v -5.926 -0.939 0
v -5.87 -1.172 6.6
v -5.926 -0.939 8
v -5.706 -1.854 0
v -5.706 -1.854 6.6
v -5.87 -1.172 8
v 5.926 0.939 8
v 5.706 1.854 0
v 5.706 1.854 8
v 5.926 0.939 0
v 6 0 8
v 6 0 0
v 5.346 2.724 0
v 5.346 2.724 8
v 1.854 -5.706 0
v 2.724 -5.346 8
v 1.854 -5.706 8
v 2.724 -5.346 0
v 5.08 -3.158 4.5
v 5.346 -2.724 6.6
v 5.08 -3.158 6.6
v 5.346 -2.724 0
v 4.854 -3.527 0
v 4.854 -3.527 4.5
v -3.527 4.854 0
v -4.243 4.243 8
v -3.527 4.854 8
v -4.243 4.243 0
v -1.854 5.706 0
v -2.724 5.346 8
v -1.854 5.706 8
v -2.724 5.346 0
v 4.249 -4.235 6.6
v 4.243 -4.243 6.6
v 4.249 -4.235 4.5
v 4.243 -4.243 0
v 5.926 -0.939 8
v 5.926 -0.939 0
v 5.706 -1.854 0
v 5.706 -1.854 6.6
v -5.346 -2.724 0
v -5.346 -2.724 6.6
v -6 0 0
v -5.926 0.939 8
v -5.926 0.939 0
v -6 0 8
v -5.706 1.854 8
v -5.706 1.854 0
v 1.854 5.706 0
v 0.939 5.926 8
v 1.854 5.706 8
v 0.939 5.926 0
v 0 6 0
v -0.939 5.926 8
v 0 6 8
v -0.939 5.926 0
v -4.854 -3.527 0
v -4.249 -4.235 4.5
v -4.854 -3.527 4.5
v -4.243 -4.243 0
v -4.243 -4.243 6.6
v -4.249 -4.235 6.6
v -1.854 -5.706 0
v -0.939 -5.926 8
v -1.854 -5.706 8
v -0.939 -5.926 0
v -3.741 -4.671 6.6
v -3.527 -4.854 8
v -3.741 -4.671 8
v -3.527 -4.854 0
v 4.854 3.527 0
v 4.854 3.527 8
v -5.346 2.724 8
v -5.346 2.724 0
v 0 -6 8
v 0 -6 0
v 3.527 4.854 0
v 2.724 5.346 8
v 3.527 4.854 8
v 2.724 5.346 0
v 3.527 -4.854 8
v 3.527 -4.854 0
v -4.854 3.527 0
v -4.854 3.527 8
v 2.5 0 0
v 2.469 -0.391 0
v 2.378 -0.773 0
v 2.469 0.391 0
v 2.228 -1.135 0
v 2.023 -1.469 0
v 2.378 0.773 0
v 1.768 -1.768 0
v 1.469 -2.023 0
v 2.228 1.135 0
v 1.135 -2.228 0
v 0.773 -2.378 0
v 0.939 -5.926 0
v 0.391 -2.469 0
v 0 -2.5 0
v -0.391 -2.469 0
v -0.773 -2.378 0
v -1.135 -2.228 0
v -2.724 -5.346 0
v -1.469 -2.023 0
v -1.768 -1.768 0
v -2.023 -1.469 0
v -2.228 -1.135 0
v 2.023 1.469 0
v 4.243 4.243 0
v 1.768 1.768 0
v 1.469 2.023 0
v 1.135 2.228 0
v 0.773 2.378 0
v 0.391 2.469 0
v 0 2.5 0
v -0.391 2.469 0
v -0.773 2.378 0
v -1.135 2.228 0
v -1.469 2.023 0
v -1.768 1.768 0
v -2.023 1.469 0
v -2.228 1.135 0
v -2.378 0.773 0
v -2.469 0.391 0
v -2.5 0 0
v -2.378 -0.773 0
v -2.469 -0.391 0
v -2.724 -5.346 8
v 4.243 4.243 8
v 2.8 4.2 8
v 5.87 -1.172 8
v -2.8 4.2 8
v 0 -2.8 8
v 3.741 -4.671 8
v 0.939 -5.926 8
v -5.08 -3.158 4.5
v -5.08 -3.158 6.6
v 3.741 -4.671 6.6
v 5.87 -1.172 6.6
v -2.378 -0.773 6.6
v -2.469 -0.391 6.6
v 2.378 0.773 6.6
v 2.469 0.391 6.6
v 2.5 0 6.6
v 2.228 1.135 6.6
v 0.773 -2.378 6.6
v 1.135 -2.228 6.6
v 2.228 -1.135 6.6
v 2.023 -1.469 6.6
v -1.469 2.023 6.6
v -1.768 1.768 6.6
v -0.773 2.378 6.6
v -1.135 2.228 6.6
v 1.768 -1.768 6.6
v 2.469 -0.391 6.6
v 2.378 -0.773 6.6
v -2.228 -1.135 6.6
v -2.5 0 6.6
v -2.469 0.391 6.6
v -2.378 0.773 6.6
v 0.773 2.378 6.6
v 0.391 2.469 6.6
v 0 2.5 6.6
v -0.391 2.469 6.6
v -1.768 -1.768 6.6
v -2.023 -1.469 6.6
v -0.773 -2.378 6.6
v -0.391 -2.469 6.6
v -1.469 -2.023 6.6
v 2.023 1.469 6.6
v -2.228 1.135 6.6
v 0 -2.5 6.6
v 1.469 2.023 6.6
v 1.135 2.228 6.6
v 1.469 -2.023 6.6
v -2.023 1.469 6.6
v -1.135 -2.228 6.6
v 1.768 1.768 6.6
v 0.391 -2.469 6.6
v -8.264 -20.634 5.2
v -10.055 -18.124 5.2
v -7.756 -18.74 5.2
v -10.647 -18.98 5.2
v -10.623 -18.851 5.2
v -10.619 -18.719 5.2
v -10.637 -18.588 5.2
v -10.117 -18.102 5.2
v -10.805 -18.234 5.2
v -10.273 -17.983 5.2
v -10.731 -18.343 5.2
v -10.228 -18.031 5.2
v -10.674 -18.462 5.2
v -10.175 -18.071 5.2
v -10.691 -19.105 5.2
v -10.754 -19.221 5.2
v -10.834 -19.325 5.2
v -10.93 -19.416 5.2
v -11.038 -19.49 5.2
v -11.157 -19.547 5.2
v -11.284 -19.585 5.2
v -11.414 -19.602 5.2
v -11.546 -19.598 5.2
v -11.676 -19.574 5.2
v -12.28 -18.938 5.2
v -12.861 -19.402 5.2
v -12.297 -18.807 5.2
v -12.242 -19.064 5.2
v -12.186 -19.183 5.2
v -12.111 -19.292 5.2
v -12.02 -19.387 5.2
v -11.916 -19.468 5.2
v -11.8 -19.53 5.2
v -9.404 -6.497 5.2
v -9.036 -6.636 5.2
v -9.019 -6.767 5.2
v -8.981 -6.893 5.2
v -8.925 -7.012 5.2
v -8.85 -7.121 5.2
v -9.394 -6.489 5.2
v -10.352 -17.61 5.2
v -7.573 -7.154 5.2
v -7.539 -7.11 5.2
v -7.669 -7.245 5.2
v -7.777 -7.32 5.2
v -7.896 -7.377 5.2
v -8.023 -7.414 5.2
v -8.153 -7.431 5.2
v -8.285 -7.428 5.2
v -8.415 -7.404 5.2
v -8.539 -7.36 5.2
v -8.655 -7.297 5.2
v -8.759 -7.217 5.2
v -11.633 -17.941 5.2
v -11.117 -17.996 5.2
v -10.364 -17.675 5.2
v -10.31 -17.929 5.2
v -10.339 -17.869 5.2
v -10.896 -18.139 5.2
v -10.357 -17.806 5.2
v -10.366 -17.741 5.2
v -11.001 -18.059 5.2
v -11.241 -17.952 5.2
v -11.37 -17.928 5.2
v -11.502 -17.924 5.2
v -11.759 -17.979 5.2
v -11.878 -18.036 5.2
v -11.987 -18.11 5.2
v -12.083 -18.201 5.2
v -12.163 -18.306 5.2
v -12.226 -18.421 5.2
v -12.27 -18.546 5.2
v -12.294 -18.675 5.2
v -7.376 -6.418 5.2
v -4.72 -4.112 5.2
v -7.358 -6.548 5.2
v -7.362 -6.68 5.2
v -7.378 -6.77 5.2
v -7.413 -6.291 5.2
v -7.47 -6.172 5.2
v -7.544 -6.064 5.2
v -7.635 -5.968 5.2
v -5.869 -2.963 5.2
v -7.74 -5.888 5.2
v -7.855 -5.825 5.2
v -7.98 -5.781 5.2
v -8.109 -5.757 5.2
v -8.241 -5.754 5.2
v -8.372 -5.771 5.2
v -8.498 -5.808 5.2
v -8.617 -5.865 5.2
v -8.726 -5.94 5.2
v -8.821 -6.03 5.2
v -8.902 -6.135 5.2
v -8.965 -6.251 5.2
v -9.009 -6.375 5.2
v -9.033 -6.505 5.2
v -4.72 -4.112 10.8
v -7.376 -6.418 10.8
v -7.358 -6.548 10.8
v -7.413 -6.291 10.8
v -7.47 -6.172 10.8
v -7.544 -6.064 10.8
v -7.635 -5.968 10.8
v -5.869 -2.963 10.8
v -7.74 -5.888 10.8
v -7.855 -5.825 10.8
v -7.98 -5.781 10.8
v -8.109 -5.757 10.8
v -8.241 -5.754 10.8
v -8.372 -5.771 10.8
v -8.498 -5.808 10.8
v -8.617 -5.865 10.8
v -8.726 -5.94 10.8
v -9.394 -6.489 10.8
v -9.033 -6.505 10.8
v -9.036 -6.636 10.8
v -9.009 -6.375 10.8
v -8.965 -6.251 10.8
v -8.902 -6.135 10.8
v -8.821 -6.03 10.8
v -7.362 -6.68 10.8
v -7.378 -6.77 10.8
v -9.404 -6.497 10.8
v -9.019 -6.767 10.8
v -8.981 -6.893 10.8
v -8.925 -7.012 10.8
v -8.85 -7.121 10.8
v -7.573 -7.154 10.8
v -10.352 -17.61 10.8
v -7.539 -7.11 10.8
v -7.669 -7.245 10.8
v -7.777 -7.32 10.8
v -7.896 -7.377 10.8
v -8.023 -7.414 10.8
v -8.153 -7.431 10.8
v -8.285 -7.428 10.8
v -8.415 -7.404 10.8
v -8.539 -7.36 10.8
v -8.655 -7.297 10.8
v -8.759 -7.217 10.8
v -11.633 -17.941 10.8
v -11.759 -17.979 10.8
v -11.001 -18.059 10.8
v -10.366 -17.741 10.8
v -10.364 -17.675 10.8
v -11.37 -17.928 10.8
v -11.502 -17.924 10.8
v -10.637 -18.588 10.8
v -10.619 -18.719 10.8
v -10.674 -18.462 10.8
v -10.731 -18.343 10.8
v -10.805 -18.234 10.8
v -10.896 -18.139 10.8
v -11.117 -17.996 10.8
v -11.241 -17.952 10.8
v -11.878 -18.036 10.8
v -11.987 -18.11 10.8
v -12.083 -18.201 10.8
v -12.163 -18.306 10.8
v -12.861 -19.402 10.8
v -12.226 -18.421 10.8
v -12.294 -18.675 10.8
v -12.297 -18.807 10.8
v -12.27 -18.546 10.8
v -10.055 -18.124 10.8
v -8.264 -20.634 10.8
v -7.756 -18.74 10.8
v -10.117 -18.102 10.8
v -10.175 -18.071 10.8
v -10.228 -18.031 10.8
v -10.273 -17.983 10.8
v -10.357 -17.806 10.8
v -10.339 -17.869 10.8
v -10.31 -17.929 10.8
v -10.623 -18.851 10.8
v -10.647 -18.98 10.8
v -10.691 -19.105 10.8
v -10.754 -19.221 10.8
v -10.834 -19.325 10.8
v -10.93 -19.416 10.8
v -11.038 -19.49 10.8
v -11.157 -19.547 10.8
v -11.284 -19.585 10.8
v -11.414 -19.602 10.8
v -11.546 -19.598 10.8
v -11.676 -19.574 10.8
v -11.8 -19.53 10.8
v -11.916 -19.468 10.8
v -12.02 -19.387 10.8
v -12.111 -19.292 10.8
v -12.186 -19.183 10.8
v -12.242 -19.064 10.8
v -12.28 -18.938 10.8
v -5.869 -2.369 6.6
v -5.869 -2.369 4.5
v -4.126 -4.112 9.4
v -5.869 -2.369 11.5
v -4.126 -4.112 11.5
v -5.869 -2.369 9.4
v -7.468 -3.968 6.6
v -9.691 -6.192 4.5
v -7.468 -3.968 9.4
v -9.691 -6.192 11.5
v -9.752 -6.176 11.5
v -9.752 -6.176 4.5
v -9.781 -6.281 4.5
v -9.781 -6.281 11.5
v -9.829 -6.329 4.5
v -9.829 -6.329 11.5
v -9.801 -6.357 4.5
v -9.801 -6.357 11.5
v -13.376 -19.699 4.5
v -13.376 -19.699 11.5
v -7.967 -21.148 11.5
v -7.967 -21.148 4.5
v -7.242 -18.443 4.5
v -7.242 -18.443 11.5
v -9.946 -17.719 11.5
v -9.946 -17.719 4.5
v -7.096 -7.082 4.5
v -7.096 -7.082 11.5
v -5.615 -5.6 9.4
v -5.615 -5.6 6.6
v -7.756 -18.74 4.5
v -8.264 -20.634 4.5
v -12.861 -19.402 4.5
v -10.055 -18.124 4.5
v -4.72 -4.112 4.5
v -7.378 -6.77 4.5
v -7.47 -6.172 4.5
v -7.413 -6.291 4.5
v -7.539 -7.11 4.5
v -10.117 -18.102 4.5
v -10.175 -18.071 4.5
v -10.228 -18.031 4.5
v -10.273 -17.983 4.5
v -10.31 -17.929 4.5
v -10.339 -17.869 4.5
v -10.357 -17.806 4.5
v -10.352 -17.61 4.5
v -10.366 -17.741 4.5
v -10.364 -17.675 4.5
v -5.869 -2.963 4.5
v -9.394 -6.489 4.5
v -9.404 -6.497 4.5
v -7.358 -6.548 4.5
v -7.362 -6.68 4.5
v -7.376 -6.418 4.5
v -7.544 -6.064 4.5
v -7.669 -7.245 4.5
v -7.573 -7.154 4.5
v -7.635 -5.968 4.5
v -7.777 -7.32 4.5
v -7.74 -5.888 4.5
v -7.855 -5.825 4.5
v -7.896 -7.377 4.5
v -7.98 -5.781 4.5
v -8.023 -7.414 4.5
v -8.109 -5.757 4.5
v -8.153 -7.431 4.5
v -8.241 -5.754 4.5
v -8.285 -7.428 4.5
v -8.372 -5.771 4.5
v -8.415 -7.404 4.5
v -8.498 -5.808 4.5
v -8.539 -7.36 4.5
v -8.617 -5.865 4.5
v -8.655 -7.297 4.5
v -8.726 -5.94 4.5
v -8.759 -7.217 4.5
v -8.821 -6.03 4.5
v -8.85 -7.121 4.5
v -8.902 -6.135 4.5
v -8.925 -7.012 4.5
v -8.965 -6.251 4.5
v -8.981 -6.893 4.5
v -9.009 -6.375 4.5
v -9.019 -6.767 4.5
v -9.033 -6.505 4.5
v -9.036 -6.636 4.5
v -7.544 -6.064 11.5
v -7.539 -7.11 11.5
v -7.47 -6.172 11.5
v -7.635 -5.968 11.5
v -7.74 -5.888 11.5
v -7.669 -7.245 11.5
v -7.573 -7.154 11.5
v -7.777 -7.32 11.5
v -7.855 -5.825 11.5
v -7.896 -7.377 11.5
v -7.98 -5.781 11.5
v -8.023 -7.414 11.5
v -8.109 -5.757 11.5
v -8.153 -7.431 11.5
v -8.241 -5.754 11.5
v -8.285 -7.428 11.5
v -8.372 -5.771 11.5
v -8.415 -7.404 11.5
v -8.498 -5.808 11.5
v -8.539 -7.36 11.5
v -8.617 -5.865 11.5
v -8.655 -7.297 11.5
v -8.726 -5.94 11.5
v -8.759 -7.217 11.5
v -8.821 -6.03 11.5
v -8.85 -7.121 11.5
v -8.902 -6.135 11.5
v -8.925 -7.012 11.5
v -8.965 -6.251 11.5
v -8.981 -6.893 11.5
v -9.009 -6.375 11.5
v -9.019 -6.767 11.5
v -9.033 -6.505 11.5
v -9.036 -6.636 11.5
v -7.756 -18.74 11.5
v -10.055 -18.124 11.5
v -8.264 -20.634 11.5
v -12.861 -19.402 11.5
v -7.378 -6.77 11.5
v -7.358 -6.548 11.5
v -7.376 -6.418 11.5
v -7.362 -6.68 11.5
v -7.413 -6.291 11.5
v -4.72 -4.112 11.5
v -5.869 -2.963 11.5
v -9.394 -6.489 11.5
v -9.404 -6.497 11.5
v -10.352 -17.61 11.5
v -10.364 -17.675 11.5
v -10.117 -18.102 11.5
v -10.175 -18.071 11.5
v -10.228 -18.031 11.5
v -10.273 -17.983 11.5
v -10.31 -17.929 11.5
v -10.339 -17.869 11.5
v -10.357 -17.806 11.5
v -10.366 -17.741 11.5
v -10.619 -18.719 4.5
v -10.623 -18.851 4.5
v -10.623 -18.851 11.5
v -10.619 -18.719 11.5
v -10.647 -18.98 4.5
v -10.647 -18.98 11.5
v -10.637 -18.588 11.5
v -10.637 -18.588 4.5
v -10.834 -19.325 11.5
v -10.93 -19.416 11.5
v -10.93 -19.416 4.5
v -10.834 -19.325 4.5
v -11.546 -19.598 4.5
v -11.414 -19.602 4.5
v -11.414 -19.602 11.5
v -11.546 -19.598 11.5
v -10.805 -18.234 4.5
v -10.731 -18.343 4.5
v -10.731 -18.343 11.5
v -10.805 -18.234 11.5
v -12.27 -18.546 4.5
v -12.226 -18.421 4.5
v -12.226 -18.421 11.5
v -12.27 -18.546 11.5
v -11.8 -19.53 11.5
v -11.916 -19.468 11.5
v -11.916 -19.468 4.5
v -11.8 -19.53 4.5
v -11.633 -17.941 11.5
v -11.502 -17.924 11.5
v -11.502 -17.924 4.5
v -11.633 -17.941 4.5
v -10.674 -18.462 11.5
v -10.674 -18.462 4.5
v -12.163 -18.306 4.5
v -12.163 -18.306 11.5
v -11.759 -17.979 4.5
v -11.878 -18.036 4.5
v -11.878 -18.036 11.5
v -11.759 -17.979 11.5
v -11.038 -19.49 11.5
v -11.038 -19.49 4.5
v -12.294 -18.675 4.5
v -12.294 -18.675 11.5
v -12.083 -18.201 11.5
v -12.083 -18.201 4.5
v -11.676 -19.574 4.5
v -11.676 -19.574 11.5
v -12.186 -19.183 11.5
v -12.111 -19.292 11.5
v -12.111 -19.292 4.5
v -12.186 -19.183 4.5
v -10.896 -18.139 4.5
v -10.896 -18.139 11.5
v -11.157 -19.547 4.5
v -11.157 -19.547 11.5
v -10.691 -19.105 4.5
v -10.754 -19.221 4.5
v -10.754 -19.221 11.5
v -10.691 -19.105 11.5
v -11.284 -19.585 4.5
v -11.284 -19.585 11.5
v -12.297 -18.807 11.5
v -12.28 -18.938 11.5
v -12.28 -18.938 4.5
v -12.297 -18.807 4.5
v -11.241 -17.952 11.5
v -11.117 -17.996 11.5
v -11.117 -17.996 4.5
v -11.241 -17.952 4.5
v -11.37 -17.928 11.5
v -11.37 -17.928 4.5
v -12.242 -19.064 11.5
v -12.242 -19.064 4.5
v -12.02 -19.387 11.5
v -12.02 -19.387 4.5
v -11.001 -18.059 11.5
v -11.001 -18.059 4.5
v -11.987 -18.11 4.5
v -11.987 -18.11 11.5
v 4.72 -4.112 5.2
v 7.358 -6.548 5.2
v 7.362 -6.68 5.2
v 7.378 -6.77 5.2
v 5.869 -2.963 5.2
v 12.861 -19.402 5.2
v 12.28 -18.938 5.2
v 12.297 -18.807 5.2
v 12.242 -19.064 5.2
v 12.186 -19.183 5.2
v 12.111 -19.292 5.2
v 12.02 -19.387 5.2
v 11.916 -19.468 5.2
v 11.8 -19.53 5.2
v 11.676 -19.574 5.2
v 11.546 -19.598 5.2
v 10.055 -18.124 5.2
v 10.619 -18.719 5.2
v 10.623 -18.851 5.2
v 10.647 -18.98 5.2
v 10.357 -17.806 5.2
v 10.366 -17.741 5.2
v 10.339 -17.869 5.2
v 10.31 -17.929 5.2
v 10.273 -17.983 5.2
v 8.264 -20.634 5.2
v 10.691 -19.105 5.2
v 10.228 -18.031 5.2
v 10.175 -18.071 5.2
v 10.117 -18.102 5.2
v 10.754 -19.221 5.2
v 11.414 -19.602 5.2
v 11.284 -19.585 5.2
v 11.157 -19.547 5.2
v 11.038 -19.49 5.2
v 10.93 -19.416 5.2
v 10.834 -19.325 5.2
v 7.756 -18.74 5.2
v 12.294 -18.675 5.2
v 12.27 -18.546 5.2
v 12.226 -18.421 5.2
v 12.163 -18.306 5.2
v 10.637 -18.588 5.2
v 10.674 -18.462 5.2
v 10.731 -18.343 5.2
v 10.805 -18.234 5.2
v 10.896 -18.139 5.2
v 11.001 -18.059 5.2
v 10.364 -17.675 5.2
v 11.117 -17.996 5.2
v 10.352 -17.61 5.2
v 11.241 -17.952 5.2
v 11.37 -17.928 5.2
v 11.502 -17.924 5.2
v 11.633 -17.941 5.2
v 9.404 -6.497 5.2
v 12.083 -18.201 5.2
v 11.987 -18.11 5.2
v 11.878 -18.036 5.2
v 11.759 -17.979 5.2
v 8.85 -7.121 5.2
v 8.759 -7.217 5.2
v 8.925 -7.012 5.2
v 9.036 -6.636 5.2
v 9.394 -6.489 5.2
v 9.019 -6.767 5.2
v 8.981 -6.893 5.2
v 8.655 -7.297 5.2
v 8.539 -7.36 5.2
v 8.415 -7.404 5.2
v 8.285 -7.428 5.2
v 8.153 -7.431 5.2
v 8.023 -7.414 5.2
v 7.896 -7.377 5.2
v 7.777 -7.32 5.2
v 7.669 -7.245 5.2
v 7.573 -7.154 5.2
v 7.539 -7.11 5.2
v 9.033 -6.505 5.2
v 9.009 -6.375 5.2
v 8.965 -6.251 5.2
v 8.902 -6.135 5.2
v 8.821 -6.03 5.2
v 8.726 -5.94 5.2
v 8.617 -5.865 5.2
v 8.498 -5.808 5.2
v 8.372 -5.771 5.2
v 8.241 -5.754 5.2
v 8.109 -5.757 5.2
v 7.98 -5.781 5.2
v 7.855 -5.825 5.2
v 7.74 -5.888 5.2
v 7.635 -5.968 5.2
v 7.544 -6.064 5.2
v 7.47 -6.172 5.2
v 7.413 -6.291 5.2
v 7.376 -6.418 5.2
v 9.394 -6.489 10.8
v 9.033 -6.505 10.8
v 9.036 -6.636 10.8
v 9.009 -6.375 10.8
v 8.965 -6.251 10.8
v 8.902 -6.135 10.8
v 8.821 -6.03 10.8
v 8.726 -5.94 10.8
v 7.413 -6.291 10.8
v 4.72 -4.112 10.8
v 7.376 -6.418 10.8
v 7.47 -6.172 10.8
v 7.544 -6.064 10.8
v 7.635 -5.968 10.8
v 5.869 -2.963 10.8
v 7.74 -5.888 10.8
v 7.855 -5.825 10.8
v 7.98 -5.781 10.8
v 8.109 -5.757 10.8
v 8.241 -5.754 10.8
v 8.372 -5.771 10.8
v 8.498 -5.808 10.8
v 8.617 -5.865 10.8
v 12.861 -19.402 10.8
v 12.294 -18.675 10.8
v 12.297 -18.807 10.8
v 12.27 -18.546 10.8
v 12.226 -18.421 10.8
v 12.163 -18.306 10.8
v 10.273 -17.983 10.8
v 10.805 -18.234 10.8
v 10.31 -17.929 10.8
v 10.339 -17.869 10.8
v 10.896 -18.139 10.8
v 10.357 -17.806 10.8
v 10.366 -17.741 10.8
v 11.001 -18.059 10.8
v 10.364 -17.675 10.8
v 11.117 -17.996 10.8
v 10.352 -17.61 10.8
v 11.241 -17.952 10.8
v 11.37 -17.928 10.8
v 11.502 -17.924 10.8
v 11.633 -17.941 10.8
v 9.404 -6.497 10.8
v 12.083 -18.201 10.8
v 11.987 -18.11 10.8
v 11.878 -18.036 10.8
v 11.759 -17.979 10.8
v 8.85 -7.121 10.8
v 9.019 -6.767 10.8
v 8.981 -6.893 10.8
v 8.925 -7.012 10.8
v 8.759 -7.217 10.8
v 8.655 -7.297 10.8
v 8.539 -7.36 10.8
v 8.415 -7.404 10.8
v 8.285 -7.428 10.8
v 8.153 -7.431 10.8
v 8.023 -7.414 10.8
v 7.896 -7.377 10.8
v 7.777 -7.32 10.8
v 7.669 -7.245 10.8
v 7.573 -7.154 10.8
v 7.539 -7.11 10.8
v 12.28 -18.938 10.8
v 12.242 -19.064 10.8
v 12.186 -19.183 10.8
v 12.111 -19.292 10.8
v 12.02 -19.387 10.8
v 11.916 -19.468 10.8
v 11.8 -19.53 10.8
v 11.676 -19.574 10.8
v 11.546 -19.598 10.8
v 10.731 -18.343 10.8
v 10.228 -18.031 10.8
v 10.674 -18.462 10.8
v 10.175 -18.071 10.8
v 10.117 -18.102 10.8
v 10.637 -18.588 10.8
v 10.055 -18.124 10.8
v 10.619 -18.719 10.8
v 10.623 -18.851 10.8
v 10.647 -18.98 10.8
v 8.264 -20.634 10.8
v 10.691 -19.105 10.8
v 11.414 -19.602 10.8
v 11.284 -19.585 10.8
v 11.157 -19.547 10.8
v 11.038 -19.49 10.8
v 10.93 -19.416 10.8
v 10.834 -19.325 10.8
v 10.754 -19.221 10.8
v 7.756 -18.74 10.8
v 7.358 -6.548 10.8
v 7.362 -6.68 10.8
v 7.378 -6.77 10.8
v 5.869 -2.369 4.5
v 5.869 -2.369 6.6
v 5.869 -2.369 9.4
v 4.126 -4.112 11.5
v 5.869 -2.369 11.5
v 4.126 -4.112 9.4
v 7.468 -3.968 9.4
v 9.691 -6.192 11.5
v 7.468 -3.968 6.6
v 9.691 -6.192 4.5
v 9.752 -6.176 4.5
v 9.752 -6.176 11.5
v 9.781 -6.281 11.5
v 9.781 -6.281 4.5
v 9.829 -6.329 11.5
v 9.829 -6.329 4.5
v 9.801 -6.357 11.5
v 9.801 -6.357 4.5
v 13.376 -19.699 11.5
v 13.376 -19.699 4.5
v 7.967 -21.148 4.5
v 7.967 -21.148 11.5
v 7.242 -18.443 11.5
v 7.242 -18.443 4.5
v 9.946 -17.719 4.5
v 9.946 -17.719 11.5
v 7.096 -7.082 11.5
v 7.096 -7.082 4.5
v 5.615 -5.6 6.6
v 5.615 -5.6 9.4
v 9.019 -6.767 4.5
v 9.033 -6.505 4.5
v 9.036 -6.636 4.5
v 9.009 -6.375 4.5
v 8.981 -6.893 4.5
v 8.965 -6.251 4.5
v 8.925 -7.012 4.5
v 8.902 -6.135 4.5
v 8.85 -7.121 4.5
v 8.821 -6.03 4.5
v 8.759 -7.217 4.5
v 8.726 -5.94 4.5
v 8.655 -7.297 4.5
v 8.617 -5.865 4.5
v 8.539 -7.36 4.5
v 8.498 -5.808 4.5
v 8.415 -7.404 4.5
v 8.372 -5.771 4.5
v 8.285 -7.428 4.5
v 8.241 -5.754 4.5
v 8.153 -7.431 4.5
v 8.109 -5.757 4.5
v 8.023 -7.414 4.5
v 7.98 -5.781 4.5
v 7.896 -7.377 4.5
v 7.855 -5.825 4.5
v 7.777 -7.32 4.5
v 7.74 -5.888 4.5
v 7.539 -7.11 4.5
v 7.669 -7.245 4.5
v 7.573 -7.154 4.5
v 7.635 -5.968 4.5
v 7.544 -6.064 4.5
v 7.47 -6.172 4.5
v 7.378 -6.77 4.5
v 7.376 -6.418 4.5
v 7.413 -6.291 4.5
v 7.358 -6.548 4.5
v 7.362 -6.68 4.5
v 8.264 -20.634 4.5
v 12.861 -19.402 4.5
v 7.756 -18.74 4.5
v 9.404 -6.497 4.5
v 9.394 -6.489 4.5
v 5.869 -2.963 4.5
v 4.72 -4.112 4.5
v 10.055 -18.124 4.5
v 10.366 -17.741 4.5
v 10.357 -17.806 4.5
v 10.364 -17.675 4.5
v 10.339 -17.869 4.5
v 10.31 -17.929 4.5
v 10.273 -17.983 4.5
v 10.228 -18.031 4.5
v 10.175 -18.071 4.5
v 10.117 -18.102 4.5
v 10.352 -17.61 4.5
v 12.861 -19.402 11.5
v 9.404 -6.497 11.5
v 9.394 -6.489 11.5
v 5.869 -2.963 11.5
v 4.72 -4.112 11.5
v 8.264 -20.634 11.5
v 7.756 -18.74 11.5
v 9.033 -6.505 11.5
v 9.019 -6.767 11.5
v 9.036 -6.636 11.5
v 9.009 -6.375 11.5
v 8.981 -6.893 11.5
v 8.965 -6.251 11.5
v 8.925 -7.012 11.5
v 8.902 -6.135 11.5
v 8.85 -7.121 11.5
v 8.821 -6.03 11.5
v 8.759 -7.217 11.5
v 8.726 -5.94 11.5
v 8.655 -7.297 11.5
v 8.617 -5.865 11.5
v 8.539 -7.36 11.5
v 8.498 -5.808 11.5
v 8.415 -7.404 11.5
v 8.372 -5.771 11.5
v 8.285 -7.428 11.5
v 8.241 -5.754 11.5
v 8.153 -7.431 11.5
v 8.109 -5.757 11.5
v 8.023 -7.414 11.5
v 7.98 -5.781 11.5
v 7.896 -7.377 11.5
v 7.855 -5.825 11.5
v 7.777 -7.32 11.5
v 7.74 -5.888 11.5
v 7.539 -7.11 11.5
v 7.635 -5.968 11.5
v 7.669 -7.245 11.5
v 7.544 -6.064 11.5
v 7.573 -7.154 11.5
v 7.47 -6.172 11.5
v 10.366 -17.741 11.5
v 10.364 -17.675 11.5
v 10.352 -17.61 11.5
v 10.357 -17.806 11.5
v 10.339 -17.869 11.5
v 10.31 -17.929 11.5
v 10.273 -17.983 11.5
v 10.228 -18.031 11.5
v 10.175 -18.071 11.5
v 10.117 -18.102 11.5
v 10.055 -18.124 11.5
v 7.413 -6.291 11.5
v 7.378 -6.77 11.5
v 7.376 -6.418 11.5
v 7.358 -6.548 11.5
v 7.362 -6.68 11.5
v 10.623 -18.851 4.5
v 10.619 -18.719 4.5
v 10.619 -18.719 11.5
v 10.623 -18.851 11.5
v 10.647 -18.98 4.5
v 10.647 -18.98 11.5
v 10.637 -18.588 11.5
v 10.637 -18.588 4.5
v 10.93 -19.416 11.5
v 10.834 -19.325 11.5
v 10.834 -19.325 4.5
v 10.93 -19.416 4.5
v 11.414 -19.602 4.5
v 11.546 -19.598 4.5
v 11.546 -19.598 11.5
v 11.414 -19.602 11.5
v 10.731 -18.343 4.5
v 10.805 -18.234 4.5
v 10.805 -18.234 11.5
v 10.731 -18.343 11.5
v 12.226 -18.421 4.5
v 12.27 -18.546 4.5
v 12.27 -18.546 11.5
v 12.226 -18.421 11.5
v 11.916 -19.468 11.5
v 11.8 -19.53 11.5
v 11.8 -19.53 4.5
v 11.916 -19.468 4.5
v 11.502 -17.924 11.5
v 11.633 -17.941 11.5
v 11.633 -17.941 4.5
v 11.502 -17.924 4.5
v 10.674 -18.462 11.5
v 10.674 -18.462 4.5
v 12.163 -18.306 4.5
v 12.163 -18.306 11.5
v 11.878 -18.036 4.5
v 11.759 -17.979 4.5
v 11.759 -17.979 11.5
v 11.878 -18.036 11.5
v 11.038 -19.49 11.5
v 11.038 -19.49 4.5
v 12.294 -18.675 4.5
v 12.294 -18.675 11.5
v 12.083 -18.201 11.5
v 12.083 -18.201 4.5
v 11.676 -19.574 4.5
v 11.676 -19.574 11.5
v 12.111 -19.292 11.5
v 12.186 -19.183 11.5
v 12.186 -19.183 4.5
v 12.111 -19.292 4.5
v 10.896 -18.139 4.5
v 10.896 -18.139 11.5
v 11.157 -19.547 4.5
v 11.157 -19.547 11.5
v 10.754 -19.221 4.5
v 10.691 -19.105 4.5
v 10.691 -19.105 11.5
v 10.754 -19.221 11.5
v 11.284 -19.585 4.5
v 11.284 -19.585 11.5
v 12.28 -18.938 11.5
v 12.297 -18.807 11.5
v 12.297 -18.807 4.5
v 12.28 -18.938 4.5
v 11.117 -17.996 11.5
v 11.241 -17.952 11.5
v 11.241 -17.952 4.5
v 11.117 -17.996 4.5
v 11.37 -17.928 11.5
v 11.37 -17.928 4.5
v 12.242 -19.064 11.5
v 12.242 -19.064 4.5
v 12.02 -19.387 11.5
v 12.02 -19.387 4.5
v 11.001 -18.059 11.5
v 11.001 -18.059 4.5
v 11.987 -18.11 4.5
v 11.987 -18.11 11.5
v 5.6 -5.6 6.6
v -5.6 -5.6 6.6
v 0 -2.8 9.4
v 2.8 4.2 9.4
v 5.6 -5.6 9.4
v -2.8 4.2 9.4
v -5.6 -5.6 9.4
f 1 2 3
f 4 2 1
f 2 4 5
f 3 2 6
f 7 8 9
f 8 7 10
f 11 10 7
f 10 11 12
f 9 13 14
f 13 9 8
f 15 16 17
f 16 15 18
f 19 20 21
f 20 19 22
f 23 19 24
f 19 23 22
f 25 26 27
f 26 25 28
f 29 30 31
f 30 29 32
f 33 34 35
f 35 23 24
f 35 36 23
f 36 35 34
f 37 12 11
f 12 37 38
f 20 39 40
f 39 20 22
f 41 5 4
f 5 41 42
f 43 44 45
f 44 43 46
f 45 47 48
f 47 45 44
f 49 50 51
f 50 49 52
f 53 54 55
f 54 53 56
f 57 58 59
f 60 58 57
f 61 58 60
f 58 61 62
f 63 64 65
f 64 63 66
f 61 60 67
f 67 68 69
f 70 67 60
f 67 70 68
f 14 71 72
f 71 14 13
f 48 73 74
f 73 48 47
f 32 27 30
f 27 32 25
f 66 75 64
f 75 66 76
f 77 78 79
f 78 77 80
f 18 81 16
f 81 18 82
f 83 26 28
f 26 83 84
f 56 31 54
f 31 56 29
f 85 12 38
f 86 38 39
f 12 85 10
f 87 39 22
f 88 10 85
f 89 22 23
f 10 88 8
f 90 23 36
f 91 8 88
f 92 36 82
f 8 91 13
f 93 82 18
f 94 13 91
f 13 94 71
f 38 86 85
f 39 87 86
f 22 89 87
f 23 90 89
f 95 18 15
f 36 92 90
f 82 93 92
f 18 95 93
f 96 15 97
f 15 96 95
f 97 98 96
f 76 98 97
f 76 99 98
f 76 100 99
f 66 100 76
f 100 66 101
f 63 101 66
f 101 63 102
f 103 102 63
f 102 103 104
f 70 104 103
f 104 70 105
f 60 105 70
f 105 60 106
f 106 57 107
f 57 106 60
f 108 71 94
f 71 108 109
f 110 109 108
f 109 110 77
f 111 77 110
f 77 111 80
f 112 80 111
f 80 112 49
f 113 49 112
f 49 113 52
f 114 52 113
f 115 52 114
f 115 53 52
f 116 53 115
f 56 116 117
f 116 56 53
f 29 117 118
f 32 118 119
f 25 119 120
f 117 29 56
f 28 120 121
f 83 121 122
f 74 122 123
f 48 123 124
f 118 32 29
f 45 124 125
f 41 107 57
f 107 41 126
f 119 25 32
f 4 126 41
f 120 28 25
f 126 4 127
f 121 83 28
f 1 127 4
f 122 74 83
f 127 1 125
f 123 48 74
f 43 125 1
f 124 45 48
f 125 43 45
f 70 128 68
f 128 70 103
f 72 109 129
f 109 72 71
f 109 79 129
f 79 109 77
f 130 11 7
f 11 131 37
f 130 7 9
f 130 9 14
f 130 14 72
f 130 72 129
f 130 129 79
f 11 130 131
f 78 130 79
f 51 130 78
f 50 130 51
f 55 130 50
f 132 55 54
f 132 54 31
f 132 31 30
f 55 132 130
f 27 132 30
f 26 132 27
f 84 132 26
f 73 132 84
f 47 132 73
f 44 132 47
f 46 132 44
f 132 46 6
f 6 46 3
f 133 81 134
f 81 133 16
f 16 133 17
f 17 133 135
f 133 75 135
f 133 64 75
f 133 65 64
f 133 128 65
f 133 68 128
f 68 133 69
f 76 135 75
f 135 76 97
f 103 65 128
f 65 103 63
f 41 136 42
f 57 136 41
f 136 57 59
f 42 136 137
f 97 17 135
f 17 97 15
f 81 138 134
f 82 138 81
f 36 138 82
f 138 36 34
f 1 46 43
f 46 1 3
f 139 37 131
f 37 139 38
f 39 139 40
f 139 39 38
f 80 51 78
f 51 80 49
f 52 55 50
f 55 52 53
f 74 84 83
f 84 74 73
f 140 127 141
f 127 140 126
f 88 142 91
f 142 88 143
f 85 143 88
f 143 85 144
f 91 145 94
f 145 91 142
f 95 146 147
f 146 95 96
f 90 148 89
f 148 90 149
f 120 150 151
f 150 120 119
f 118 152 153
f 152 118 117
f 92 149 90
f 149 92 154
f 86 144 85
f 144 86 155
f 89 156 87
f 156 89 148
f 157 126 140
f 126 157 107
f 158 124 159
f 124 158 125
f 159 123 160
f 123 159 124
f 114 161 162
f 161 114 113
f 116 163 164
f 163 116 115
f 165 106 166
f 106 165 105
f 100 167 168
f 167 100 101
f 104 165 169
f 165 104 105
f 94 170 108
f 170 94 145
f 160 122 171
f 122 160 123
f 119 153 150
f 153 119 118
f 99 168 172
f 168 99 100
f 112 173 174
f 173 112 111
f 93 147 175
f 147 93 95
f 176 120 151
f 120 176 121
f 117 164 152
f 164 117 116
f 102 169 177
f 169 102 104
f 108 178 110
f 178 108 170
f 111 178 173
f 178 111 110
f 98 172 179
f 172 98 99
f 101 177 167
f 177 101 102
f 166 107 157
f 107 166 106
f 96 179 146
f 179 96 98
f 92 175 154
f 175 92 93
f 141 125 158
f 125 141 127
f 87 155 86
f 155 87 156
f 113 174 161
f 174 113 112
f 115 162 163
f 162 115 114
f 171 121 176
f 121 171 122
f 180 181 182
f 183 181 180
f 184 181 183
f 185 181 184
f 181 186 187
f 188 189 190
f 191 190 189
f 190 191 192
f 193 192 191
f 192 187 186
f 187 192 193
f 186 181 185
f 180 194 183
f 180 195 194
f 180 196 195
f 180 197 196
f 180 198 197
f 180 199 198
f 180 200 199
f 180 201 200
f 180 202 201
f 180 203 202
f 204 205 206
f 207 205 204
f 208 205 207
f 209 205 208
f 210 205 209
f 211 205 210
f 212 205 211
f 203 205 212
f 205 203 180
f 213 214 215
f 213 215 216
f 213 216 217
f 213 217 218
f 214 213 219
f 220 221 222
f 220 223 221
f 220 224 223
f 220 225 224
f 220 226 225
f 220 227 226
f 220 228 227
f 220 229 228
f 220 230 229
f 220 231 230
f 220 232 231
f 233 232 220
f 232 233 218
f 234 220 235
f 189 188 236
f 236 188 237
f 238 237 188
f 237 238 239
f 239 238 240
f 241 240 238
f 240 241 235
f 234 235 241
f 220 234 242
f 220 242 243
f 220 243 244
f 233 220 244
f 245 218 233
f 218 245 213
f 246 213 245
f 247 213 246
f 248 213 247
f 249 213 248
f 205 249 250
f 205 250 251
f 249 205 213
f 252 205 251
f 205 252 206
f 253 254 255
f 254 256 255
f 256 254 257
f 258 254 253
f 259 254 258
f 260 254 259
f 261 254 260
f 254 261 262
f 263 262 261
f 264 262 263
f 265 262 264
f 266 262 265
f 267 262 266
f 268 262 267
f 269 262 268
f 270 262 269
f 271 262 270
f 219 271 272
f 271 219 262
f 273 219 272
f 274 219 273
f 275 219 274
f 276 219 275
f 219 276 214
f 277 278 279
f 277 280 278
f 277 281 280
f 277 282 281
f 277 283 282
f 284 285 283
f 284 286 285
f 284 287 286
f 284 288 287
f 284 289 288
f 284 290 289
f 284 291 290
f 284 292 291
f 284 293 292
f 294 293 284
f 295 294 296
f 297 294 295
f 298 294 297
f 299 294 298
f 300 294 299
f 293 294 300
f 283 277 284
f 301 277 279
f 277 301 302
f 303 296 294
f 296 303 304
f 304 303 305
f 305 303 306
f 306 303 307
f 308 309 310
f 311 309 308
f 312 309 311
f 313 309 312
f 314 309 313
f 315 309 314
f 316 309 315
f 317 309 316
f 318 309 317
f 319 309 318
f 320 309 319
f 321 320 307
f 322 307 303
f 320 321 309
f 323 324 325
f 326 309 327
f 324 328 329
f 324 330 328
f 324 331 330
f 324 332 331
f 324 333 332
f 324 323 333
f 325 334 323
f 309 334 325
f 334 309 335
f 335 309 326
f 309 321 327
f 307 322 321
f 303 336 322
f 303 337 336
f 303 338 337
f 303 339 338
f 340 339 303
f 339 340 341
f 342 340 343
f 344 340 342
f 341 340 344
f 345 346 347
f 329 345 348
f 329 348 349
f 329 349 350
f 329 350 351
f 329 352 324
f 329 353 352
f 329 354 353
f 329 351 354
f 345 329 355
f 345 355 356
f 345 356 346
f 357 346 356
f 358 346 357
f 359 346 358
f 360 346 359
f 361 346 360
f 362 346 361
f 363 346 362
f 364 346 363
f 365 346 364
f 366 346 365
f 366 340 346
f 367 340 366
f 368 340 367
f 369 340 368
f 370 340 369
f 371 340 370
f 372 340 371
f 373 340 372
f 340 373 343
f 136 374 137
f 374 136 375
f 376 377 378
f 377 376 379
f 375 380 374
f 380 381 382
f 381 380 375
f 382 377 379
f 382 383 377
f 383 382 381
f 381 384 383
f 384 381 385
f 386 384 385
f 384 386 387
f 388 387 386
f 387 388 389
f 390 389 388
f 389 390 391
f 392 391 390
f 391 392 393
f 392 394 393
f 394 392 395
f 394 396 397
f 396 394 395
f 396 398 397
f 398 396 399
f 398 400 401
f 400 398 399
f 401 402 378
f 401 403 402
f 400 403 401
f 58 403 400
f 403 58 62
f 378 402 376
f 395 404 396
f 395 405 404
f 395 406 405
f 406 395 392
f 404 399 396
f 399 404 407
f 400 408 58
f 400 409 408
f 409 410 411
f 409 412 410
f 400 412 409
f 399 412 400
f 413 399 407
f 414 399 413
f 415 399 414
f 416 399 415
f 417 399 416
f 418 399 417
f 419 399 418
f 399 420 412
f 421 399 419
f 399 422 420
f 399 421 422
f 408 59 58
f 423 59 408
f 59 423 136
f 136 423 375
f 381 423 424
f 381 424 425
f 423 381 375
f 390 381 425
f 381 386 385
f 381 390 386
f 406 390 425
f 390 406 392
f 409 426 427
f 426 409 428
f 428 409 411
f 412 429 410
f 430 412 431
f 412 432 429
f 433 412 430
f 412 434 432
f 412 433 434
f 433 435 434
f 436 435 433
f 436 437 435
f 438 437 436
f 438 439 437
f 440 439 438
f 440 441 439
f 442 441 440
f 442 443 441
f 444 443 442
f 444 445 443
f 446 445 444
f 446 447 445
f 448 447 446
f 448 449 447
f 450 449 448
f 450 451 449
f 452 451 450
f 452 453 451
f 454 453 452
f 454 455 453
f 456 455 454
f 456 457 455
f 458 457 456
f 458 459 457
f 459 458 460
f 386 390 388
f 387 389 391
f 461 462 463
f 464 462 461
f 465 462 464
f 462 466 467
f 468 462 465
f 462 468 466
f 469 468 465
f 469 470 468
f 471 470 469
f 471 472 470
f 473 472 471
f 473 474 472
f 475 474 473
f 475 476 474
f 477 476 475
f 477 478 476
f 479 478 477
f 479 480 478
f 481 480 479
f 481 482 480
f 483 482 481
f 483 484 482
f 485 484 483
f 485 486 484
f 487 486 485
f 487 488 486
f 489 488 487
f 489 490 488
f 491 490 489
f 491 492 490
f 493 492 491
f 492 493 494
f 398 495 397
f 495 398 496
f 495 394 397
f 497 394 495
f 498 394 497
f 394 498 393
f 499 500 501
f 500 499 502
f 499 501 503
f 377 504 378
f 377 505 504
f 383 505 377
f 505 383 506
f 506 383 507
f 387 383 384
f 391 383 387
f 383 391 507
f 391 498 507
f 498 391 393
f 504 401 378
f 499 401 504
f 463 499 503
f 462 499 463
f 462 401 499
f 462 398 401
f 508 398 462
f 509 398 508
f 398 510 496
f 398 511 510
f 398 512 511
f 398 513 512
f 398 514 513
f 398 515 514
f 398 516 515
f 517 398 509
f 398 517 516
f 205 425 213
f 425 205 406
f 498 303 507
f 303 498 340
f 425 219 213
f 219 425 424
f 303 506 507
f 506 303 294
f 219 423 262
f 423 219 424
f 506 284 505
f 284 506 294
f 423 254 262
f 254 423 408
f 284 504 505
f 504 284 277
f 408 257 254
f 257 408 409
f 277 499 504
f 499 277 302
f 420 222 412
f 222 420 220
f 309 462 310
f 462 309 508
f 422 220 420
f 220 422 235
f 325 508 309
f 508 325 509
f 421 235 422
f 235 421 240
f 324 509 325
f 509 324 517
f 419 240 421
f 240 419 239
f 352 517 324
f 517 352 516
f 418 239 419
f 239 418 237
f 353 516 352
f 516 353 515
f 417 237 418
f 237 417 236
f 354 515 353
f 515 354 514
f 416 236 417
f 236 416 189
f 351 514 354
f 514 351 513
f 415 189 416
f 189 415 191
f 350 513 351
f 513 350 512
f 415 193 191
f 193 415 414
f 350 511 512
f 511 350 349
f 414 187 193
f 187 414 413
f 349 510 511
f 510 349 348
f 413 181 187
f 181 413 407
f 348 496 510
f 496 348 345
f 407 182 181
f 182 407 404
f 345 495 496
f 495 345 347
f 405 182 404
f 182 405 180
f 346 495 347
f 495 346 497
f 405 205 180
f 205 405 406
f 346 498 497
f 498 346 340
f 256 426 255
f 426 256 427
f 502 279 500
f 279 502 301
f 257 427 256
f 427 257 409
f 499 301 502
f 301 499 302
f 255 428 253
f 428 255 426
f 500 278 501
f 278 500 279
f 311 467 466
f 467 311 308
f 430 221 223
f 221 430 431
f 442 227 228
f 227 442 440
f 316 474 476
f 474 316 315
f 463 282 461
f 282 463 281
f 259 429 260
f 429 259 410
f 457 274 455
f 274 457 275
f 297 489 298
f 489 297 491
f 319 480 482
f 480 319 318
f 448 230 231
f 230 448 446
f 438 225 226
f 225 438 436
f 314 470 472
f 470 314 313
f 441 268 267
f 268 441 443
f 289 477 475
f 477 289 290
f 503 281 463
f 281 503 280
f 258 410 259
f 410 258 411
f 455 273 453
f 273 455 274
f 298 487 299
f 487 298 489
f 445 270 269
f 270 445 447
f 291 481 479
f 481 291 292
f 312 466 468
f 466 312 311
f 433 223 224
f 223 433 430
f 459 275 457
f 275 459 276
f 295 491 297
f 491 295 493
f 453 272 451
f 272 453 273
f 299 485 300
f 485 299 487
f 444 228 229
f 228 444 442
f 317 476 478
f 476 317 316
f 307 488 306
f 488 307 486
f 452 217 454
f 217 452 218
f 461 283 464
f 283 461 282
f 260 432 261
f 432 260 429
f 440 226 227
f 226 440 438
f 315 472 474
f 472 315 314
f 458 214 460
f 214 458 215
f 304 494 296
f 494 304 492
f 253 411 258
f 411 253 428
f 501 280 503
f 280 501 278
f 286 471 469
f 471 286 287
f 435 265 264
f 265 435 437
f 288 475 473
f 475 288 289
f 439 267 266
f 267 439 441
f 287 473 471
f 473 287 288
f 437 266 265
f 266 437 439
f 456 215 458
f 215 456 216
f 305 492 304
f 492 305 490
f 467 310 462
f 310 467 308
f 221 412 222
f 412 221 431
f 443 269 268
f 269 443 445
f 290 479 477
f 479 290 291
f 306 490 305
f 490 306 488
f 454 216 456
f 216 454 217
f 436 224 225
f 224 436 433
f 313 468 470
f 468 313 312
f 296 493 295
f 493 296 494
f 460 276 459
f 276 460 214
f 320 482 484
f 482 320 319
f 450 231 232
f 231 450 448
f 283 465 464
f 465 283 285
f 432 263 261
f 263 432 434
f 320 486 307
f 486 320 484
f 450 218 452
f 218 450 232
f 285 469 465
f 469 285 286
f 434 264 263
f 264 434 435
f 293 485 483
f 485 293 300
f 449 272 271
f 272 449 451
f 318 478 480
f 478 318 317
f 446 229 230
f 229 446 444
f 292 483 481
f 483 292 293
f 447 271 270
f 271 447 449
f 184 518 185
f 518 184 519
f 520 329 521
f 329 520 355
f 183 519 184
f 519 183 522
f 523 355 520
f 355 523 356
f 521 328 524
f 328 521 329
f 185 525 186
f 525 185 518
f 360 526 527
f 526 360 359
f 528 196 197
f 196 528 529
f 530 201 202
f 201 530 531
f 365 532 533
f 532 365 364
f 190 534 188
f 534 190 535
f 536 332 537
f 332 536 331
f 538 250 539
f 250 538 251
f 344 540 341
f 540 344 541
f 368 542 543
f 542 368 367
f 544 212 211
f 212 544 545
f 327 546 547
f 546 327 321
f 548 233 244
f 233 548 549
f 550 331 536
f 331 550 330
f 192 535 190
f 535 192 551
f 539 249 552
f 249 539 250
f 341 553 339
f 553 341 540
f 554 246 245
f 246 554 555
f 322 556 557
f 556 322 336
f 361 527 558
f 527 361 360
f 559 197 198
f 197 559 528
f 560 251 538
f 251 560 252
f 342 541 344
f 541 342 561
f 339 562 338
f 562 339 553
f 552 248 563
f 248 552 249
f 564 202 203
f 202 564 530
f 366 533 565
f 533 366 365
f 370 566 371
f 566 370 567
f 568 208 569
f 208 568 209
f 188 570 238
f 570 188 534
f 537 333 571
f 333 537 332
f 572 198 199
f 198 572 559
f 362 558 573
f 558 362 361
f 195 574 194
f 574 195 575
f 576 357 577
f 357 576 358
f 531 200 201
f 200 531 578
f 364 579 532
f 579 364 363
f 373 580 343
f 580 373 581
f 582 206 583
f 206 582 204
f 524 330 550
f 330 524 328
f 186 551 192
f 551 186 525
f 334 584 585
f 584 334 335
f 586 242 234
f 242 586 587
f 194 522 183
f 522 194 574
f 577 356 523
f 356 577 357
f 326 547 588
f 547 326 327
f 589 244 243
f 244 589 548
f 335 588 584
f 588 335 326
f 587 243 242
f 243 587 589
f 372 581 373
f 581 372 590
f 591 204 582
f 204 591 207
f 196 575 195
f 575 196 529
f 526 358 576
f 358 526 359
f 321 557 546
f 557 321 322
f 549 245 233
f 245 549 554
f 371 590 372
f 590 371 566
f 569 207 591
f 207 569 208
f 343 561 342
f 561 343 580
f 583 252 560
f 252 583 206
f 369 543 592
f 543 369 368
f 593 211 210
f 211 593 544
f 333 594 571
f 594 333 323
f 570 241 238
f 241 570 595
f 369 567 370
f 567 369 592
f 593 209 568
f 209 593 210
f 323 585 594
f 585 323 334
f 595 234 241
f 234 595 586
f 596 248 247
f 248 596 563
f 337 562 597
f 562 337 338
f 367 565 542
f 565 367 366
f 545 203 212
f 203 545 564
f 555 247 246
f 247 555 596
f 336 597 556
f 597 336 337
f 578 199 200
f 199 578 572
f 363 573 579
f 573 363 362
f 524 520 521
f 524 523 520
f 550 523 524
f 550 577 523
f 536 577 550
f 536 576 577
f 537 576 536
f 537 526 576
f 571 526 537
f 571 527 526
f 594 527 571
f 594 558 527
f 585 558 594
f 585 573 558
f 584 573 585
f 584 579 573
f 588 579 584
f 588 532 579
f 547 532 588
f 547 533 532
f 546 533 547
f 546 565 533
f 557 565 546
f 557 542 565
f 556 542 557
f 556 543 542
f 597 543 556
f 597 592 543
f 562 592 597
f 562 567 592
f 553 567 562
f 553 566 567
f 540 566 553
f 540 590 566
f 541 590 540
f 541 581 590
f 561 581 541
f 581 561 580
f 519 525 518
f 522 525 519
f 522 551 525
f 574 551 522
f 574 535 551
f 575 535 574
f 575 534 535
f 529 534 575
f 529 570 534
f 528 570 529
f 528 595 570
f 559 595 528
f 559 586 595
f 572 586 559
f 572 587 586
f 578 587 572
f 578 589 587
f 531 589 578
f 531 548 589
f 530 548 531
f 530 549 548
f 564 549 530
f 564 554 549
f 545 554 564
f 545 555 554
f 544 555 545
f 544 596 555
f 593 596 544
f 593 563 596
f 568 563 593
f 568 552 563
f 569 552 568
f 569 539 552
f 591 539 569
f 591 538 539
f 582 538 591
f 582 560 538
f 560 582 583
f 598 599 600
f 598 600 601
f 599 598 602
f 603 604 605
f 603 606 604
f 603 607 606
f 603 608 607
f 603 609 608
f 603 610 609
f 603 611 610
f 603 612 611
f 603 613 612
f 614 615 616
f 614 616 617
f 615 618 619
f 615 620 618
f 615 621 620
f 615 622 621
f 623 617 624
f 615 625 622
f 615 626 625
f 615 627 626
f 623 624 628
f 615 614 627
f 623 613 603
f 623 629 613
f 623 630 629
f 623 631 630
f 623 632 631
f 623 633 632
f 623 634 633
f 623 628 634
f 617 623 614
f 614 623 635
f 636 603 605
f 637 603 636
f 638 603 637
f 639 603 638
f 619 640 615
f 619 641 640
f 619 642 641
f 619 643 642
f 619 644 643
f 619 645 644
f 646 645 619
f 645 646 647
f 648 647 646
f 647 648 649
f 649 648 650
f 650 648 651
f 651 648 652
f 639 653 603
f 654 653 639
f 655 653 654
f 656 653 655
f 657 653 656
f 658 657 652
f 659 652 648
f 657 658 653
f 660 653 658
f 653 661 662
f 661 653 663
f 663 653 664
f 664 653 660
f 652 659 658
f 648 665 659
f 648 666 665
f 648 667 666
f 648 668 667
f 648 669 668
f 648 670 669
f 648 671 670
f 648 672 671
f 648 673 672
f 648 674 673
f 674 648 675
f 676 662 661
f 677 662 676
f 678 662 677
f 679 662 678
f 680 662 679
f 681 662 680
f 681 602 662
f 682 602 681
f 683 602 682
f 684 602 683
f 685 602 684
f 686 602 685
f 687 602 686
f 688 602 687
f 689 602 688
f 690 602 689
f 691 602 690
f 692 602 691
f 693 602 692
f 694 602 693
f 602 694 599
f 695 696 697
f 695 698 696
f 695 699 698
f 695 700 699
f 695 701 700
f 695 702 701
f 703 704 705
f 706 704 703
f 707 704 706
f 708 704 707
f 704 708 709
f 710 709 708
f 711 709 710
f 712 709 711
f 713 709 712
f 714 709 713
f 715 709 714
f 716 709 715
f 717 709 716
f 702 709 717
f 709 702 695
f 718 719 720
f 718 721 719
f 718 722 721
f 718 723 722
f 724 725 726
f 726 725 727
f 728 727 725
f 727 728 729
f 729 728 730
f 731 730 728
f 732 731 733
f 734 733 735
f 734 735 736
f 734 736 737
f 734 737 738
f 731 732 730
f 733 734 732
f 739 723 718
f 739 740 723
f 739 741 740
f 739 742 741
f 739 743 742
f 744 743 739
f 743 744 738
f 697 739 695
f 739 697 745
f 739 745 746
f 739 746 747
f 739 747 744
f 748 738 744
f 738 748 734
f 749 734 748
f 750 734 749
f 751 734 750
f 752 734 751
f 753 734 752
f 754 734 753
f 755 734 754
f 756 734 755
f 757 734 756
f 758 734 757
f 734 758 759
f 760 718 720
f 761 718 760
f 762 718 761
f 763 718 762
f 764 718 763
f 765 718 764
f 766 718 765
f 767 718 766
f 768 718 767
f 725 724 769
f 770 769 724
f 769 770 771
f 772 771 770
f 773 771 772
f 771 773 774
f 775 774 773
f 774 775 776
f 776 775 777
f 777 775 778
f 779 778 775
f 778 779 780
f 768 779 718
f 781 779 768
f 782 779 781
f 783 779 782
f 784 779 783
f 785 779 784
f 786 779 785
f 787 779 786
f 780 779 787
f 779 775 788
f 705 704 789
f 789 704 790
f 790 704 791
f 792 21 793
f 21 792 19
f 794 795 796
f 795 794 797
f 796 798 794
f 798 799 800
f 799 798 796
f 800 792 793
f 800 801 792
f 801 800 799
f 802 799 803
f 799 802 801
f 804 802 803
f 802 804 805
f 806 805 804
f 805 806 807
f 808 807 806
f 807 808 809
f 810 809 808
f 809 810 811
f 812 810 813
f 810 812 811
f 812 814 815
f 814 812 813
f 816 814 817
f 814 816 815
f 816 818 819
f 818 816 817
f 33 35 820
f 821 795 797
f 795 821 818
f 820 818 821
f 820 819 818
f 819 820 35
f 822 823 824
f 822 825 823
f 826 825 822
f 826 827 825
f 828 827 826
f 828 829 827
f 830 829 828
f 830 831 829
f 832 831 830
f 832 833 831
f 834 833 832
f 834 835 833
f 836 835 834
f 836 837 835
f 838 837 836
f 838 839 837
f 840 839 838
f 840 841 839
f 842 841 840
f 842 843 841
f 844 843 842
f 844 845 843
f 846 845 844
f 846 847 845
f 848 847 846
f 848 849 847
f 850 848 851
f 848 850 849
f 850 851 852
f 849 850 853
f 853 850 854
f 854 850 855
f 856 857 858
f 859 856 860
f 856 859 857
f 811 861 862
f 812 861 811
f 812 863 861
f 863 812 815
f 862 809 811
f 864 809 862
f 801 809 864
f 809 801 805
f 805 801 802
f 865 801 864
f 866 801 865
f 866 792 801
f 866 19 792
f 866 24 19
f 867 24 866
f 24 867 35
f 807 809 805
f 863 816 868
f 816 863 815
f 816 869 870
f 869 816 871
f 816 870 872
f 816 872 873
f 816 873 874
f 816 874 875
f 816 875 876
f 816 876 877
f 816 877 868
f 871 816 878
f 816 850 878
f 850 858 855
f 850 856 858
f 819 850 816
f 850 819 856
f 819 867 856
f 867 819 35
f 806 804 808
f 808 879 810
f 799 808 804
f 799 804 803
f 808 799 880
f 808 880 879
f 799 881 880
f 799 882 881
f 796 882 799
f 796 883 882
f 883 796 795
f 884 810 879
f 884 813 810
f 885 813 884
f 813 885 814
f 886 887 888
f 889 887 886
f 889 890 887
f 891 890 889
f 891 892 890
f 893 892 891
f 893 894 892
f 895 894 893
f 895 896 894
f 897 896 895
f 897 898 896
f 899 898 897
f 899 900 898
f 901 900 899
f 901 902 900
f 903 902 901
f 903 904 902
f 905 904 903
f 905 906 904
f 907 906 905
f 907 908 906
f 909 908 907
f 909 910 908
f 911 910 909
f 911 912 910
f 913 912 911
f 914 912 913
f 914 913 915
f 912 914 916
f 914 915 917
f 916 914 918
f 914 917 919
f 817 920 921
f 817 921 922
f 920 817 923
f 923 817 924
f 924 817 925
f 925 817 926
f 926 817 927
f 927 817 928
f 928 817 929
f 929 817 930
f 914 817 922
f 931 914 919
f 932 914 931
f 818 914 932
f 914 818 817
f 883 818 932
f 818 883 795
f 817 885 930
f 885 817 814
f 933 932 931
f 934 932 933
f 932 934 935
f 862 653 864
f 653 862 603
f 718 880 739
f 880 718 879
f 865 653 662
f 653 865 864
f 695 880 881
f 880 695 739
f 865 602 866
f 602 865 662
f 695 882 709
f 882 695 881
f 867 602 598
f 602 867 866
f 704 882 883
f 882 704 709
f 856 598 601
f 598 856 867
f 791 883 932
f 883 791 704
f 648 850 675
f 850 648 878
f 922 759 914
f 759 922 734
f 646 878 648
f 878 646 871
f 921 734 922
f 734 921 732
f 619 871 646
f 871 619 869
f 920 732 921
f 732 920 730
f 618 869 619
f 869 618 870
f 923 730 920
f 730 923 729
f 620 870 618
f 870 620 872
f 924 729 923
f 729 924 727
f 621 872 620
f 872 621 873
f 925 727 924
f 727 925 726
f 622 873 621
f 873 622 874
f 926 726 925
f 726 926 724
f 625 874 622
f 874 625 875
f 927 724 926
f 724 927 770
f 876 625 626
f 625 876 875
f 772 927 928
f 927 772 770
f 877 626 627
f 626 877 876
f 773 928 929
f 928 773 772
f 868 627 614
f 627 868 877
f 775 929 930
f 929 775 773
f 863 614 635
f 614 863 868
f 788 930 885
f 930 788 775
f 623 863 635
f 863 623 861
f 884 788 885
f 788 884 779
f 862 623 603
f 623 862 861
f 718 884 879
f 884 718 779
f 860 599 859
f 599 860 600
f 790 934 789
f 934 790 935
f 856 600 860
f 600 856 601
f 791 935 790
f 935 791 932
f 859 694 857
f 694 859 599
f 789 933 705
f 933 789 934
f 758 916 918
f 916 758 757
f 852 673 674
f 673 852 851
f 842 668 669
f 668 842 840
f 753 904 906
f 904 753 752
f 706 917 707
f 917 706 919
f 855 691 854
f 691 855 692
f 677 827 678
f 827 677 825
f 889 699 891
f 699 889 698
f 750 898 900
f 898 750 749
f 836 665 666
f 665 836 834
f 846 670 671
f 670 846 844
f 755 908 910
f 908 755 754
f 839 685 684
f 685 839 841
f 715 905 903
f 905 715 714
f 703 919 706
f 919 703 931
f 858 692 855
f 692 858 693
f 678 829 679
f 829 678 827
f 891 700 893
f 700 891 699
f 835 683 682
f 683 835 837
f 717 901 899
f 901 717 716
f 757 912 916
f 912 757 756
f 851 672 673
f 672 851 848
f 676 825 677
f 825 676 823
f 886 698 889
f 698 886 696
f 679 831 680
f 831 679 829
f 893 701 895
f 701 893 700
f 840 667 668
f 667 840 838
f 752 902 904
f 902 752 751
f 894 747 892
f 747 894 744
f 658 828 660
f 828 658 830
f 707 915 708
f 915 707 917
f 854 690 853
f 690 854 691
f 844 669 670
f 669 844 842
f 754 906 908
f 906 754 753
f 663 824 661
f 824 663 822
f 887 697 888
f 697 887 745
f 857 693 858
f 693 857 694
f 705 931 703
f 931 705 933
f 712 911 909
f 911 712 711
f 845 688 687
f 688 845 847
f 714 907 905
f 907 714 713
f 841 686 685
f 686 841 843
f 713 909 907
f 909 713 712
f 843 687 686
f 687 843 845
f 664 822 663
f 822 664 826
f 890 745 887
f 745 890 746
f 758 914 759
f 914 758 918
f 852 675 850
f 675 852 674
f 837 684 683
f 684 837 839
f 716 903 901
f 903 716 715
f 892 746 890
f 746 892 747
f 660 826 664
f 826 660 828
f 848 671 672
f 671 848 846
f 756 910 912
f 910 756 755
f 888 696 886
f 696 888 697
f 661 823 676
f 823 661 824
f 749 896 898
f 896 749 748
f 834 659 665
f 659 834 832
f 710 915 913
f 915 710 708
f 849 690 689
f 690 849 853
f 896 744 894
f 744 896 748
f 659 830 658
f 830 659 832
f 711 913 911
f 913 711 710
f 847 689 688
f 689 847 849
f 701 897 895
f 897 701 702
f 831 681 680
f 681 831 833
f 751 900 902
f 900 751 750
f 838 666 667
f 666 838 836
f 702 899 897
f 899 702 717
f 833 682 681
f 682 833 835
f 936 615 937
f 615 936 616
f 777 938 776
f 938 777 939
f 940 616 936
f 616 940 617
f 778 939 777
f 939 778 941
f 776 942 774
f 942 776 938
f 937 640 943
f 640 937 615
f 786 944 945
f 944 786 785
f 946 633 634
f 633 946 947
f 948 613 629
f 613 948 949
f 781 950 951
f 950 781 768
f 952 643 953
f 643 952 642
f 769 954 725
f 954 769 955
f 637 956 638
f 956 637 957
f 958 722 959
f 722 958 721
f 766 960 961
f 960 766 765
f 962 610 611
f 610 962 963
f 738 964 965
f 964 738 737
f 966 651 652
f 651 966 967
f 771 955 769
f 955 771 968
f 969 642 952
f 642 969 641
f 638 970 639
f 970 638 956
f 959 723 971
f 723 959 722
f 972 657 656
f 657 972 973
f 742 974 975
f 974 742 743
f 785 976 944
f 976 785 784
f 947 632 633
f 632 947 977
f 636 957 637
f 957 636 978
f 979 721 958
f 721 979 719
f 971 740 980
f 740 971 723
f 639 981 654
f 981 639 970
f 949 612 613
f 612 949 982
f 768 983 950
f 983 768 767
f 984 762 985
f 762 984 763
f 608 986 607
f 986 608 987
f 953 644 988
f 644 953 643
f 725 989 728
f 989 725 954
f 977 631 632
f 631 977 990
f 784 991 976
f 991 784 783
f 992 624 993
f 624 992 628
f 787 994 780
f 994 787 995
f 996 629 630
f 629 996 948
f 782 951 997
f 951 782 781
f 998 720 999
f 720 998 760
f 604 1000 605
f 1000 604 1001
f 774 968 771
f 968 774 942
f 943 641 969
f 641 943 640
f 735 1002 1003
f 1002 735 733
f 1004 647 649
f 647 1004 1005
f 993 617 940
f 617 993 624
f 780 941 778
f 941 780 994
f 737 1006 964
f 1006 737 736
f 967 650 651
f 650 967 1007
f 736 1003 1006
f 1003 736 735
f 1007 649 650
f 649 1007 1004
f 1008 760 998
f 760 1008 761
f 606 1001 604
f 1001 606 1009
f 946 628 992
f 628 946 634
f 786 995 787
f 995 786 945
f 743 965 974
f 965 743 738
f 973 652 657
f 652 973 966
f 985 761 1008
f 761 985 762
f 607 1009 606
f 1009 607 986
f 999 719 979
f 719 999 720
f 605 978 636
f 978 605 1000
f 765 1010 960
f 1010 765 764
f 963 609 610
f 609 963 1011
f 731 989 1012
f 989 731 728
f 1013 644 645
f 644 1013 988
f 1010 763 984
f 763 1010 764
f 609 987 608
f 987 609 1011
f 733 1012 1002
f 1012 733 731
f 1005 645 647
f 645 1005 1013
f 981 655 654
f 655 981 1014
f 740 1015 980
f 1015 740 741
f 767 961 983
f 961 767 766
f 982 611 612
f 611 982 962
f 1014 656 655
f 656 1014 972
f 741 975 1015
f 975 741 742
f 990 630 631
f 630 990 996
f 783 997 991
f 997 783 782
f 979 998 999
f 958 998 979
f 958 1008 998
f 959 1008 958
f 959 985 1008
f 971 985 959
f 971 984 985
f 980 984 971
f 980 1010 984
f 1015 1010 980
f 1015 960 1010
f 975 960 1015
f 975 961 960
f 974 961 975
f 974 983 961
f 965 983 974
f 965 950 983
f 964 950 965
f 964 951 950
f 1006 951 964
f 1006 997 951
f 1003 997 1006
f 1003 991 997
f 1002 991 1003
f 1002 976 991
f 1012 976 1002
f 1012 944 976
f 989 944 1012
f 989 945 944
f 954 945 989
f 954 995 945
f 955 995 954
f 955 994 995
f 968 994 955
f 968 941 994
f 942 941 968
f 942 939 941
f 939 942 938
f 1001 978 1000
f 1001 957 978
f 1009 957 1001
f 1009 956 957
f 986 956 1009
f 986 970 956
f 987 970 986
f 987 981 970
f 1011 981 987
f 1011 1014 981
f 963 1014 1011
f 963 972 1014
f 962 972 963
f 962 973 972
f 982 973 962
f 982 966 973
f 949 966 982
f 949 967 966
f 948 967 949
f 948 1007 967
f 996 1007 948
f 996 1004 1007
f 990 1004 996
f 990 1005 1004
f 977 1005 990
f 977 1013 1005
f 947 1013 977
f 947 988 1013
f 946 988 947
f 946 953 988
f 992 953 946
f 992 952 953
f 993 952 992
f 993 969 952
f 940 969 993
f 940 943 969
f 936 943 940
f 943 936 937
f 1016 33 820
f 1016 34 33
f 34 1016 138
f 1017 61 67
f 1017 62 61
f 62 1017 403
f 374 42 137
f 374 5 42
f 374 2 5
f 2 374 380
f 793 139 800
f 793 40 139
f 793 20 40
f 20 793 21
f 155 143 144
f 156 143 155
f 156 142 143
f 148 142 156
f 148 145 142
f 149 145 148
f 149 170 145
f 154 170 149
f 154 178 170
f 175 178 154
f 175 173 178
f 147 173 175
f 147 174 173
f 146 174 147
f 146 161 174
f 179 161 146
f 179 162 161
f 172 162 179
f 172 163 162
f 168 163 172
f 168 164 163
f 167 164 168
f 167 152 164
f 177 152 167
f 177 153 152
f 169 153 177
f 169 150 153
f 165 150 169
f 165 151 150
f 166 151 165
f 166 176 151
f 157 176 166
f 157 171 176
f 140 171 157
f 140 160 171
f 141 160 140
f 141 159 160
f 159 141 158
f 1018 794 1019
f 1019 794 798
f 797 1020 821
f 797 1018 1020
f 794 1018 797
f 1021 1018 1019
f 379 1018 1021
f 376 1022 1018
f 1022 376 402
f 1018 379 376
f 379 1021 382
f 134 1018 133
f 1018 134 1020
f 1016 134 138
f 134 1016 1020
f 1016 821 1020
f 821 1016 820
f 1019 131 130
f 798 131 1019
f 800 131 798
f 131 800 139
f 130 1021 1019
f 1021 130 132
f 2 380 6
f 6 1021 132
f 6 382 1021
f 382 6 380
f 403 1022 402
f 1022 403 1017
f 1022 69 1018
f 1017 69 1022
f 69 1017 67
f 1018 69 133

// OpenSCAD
//-------------------------------//
// Braço Robótico - Grip Paramétrico
//-------------------------------//

$fn = 40;

// ===== Variáveis ajustáveis =====

escala_garra = 1.4;      // aumenta ou reduz toda a garra
abertura = -15;          // ângulo de abertura
dupla_garra = false;     // gera uma ou duas garras

raio_base = 6;
altura_base = 8;
diametro_furo = 5;

// ===============================

Grip();

module Grip() {

    // Base de articulação
    difference() {
        cylinder(r=raio_base,h=altura_base);

        translate([0,0,-1])
        cylinder(
            d=diametro_furo,
            h=altura_base+2
        );
    }

    translate([0,0,altura_base])
    Hand2();
}

module Hand2() {

    Hand1();

    if (dupla_garra)
        rotate([0,0,180])
        Hand1();
}

module Hand1() {

    scale([escala_garra,escala_garra,escala_garra]) {

        hand();

        PL = [
            [-4,-4],
            [-6,-4],
            [-2,3],
            [2,3],
            [6,-4],
            [4,-4],
            [0,-2]
        ];

        translate([0,0,-1])
        linear_extrude(2)
        polygon(PL);
    }
}

module Fingers_2d() {

    translate([-1,-10]) {

        square([2,10]);

        translate([2,0])
        square([2,2]);

        translate([1.5,9])
        rotate(60)
        square([4,1.76]);
    }
}

module hand() {

    translate([0,0,-2.5]) {

        MirrorCopy([1,0,0])

        translate([-6,-4.67])
        rotate(abertura) {

            translate([0,0,.5])

            linear_extrude(4)
            Fingers_2d();

            linear_extrude(5)
            difference() {

                Fingers_2d();

                offset(-0.3)
                Fingers_2d();
            }

            translate([0.15,0])
            cylinder(r=.6,h=5);

            translate([0.15,-9,0])
            cylinder(r=.6,h=5);
        }
    }
}

module MirrorCopy(M) {

    children();

    mirror(M)
    children();
}
